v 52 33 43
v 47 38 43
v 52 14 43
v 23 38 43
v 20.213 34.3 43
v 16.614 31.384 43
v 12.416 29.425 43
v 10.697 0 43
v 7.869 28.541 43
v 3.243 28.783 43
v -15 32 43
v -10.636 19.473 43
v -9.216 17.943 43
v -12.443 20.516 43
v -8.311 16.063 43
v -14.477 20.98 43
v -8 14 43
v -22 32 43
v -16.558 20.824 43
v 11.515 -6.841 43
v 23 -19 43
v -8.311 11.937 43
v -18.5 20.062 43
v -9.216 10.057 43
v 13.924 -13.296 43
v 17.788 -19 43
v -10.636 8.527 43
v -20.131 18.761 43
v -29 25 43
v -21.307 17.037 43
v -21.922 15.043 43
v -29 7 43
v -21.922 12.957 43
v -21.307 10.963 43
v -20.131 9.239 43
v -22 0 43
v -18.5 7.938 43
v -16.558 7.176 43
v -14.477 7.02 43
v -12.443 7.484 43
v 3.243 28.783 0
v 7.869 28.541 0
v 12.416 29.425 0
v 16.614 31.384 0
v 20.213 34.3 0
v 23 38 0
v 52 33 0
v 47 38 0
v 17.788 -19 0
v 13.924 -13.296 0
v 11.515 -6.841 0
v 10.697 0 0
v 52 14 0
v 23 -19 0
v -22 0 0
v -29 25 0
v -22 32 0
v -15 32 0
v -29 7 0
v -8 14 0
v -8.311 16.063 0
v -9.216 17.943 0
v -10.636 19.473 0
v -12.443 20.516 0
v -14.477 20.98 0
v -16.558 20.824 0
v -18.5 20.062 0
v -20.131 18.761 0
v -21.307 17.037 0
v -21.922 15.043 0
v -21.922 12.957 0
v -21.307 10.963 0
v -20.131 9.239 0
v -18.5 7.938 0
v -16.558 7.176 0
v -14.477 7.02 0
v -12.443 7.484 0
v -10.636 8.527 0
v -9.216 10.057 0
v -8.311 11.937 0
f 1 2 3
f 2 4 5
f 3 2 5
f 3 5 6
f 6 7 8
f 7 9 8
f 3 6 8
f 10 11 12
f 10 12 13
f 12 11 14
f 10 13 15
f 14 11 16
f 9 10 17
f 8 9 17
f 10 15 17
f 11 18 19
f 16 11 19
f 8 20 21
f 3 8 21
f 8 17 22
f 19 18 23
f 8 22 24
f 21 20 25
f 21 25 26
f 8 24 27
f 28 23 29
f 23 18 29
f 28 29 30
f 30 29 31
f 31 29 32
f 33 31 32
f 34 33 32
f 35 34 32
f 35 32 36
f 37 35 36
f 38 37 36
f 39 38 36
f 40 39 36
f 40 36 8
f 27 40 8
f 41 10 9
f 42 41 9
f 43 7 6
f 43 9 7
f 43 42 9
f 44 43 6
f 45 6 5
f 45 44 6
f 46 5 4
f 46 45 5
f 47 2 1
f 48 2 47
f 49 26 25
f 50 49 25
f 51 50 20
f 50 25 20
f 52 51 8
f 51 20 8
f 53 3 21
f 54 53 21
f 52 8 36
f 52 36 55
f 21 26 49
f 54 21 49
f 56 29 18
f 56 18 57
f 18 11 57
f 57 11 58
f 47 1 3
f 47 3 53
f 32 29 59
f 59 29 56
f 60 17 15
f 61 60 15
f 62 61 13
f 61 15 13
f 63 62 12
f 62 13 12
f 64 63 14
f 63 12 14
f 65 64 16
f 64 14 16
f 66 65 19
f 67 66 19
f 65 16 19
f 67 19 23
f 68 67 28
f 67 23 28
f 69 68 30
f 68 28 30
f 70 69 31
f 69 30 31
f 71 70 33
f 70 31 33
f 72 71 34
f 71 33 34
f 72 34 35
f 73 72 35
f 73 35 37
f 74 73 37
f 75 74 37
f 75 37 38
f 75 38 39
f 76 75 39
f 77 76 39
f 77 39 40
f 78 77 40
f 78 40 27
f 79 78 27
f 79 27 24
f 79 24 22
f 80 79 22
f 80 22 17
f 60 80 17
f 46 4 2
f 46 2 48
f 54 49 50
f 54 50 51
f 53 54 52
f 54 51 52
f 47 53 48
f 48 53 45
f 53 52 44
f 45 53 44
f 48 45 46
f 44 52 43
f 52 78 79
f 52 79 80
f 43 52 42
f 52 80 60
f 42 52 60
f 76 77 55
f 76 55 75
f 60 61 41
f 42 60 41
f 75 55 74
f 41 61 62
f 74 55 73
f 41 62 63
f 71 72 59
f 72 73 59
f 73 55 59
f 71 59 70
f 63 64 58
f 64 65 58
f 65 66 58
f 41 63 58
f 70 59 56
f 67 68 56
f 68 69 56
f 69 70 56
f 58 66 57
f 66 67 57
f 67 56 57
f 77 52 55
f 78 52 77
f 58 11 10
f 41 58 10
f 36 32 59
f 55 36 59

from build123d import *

# Parameters (mm, degrees)
SKETCH1_W              = 43
SKETCH1_H              = 32
BOSS_EXTRUDE1_DEPTH    = 29
SKETCH2_W              = 43
SKETCH2_H              = 38
SKETCH2_H_2            = 19
BOSS_EXTRUDE2_DEPTH    = 52
CHAMFER1_SIZE          = 7
SKETCH3_R              = 7
CUT_EXTRUDE1_DEPTH     = 78.440299586
CHAMFER2_SIZE          = 5
SPLIT1_SURFACE_1_BACK  = 108.977
SPLIT1_SURFACE_1_DEPTH = 217.954
CUT_EXTRUDE2_DEPTH     = 52
CUT_EXTRUDE7_DEPTH     = 78.440299586


with BuildPart() as part:
    # Sketch1 → Boss-Extrude1 (new body)
    with BuildSketch(Plane(origin=(0, 0, 0), x_dir=(0, 0, -1), z_dir=(1, 0, 0))):
        with Locations((-21.5, 16)):
            Rectangle(SKETCH1_W, SKETCH1_H)
    extrude(amount=-BOSS_EXTRUDE1_DEPTH)

    # Sketch2 → Boss-Extrude2 (add)
    with BuildSketch(Plane(origin=(0, 0, 0), x_dir=(0, 0, -1), z_dir=(1, 0, 0))):
        with Locations((-21.5, 19)):
            Rectangle(SKETCH2_W, SKETCH2_H)
        with Locations((-21.5, -9.5)):
            Rectangle(SKETCH2_W, SKETCH2_H_2)
    extrude(amount=BOSS_EXTRUDE2_DEPTH)

    # Chamfer1
    chamfer1_edges = [part.edges().sort_by_distance(p)[0] for p in [
        (-29, 0, 21.5),
        (-29, 32, 21.5),
    ]]
    chamfer(chamfer1_edges, length=CHAMFER1_SIZE)

    # Sketch3 → Cut-Extrude1 (cut, through all)
    with BuildSketch(Plane.XY.offset(43)):
        with Locations((-15, 14)):
            Circle(SKETCH3_R)
    extrude(amount=-CUT_EXTRUDE1_DEPTH, mode=Mode.SUBTRACT)

    # Chamfer2
    chamfer2_edges = [part.edges().sort_by_distance(p)[0] for p in [
        (52, 38, 21.5),
    ]]
    chamfer(chamfer2_edges, length=CHAMFER2_SIZE)

    # Split1: cut with a surface, the side behind it stays
    # Split1 surface: a surface, the sketch's curves swept straight by 217.954 mm
    with BuildLine(Plane.XY.offset(-SPLIT1_SURFACE_1_BACK), mode=Mode.PRIVATE) as split1_surface_1_path:
        Line((-15, 32), (3.243084988, 28.783251905))
        ThreePointArc((3.243084988, 28.783251905), (14.574972961, 30.276069151), (23, 38))
    split1_surface_1 = Shell.extrude(split1_surface_1_path.wire(), (0 * SPLIT1_SURFACE_1_DEPTH, 0 * SPLIT1_SURFACE_1_DEPTH, 1 * SPLIT1_SURFACE_1_DEPTH))
    split(bisect_by=split1_surface_1, keep=Keep.BOTTOM)

    # Sketch6 → Cut-Extrude2 (cut)
    with BuildSketch(Plane.XY.offset(43)):
        Polygon((52, -19), (52, 14), (23, -19), align=None)
    extrude(amount=-CUT_EXTRUDE2_DEPTH, mode=Mode.SUBTRACT)

    # Sketch7 → Cut-Extrude7 (cut, through all)
    with BuildSketch(Plane.XY.offset(43)):
        with BuildLine():
            ThreePointArc((17.788067397, -19), (12.527518408, -10.140064923), (10.696969697, 0))
            Line((10.696969697, 0), (0, 0))
            Line((0, 0), (0, -19))
            Line((0, -19), (17.788067397, -19))
        make_face()
    extrude(amount=-CUT_EXTRUDE7_DEPTH, mode=Mode.SUBTRACT)


solid = part.part
